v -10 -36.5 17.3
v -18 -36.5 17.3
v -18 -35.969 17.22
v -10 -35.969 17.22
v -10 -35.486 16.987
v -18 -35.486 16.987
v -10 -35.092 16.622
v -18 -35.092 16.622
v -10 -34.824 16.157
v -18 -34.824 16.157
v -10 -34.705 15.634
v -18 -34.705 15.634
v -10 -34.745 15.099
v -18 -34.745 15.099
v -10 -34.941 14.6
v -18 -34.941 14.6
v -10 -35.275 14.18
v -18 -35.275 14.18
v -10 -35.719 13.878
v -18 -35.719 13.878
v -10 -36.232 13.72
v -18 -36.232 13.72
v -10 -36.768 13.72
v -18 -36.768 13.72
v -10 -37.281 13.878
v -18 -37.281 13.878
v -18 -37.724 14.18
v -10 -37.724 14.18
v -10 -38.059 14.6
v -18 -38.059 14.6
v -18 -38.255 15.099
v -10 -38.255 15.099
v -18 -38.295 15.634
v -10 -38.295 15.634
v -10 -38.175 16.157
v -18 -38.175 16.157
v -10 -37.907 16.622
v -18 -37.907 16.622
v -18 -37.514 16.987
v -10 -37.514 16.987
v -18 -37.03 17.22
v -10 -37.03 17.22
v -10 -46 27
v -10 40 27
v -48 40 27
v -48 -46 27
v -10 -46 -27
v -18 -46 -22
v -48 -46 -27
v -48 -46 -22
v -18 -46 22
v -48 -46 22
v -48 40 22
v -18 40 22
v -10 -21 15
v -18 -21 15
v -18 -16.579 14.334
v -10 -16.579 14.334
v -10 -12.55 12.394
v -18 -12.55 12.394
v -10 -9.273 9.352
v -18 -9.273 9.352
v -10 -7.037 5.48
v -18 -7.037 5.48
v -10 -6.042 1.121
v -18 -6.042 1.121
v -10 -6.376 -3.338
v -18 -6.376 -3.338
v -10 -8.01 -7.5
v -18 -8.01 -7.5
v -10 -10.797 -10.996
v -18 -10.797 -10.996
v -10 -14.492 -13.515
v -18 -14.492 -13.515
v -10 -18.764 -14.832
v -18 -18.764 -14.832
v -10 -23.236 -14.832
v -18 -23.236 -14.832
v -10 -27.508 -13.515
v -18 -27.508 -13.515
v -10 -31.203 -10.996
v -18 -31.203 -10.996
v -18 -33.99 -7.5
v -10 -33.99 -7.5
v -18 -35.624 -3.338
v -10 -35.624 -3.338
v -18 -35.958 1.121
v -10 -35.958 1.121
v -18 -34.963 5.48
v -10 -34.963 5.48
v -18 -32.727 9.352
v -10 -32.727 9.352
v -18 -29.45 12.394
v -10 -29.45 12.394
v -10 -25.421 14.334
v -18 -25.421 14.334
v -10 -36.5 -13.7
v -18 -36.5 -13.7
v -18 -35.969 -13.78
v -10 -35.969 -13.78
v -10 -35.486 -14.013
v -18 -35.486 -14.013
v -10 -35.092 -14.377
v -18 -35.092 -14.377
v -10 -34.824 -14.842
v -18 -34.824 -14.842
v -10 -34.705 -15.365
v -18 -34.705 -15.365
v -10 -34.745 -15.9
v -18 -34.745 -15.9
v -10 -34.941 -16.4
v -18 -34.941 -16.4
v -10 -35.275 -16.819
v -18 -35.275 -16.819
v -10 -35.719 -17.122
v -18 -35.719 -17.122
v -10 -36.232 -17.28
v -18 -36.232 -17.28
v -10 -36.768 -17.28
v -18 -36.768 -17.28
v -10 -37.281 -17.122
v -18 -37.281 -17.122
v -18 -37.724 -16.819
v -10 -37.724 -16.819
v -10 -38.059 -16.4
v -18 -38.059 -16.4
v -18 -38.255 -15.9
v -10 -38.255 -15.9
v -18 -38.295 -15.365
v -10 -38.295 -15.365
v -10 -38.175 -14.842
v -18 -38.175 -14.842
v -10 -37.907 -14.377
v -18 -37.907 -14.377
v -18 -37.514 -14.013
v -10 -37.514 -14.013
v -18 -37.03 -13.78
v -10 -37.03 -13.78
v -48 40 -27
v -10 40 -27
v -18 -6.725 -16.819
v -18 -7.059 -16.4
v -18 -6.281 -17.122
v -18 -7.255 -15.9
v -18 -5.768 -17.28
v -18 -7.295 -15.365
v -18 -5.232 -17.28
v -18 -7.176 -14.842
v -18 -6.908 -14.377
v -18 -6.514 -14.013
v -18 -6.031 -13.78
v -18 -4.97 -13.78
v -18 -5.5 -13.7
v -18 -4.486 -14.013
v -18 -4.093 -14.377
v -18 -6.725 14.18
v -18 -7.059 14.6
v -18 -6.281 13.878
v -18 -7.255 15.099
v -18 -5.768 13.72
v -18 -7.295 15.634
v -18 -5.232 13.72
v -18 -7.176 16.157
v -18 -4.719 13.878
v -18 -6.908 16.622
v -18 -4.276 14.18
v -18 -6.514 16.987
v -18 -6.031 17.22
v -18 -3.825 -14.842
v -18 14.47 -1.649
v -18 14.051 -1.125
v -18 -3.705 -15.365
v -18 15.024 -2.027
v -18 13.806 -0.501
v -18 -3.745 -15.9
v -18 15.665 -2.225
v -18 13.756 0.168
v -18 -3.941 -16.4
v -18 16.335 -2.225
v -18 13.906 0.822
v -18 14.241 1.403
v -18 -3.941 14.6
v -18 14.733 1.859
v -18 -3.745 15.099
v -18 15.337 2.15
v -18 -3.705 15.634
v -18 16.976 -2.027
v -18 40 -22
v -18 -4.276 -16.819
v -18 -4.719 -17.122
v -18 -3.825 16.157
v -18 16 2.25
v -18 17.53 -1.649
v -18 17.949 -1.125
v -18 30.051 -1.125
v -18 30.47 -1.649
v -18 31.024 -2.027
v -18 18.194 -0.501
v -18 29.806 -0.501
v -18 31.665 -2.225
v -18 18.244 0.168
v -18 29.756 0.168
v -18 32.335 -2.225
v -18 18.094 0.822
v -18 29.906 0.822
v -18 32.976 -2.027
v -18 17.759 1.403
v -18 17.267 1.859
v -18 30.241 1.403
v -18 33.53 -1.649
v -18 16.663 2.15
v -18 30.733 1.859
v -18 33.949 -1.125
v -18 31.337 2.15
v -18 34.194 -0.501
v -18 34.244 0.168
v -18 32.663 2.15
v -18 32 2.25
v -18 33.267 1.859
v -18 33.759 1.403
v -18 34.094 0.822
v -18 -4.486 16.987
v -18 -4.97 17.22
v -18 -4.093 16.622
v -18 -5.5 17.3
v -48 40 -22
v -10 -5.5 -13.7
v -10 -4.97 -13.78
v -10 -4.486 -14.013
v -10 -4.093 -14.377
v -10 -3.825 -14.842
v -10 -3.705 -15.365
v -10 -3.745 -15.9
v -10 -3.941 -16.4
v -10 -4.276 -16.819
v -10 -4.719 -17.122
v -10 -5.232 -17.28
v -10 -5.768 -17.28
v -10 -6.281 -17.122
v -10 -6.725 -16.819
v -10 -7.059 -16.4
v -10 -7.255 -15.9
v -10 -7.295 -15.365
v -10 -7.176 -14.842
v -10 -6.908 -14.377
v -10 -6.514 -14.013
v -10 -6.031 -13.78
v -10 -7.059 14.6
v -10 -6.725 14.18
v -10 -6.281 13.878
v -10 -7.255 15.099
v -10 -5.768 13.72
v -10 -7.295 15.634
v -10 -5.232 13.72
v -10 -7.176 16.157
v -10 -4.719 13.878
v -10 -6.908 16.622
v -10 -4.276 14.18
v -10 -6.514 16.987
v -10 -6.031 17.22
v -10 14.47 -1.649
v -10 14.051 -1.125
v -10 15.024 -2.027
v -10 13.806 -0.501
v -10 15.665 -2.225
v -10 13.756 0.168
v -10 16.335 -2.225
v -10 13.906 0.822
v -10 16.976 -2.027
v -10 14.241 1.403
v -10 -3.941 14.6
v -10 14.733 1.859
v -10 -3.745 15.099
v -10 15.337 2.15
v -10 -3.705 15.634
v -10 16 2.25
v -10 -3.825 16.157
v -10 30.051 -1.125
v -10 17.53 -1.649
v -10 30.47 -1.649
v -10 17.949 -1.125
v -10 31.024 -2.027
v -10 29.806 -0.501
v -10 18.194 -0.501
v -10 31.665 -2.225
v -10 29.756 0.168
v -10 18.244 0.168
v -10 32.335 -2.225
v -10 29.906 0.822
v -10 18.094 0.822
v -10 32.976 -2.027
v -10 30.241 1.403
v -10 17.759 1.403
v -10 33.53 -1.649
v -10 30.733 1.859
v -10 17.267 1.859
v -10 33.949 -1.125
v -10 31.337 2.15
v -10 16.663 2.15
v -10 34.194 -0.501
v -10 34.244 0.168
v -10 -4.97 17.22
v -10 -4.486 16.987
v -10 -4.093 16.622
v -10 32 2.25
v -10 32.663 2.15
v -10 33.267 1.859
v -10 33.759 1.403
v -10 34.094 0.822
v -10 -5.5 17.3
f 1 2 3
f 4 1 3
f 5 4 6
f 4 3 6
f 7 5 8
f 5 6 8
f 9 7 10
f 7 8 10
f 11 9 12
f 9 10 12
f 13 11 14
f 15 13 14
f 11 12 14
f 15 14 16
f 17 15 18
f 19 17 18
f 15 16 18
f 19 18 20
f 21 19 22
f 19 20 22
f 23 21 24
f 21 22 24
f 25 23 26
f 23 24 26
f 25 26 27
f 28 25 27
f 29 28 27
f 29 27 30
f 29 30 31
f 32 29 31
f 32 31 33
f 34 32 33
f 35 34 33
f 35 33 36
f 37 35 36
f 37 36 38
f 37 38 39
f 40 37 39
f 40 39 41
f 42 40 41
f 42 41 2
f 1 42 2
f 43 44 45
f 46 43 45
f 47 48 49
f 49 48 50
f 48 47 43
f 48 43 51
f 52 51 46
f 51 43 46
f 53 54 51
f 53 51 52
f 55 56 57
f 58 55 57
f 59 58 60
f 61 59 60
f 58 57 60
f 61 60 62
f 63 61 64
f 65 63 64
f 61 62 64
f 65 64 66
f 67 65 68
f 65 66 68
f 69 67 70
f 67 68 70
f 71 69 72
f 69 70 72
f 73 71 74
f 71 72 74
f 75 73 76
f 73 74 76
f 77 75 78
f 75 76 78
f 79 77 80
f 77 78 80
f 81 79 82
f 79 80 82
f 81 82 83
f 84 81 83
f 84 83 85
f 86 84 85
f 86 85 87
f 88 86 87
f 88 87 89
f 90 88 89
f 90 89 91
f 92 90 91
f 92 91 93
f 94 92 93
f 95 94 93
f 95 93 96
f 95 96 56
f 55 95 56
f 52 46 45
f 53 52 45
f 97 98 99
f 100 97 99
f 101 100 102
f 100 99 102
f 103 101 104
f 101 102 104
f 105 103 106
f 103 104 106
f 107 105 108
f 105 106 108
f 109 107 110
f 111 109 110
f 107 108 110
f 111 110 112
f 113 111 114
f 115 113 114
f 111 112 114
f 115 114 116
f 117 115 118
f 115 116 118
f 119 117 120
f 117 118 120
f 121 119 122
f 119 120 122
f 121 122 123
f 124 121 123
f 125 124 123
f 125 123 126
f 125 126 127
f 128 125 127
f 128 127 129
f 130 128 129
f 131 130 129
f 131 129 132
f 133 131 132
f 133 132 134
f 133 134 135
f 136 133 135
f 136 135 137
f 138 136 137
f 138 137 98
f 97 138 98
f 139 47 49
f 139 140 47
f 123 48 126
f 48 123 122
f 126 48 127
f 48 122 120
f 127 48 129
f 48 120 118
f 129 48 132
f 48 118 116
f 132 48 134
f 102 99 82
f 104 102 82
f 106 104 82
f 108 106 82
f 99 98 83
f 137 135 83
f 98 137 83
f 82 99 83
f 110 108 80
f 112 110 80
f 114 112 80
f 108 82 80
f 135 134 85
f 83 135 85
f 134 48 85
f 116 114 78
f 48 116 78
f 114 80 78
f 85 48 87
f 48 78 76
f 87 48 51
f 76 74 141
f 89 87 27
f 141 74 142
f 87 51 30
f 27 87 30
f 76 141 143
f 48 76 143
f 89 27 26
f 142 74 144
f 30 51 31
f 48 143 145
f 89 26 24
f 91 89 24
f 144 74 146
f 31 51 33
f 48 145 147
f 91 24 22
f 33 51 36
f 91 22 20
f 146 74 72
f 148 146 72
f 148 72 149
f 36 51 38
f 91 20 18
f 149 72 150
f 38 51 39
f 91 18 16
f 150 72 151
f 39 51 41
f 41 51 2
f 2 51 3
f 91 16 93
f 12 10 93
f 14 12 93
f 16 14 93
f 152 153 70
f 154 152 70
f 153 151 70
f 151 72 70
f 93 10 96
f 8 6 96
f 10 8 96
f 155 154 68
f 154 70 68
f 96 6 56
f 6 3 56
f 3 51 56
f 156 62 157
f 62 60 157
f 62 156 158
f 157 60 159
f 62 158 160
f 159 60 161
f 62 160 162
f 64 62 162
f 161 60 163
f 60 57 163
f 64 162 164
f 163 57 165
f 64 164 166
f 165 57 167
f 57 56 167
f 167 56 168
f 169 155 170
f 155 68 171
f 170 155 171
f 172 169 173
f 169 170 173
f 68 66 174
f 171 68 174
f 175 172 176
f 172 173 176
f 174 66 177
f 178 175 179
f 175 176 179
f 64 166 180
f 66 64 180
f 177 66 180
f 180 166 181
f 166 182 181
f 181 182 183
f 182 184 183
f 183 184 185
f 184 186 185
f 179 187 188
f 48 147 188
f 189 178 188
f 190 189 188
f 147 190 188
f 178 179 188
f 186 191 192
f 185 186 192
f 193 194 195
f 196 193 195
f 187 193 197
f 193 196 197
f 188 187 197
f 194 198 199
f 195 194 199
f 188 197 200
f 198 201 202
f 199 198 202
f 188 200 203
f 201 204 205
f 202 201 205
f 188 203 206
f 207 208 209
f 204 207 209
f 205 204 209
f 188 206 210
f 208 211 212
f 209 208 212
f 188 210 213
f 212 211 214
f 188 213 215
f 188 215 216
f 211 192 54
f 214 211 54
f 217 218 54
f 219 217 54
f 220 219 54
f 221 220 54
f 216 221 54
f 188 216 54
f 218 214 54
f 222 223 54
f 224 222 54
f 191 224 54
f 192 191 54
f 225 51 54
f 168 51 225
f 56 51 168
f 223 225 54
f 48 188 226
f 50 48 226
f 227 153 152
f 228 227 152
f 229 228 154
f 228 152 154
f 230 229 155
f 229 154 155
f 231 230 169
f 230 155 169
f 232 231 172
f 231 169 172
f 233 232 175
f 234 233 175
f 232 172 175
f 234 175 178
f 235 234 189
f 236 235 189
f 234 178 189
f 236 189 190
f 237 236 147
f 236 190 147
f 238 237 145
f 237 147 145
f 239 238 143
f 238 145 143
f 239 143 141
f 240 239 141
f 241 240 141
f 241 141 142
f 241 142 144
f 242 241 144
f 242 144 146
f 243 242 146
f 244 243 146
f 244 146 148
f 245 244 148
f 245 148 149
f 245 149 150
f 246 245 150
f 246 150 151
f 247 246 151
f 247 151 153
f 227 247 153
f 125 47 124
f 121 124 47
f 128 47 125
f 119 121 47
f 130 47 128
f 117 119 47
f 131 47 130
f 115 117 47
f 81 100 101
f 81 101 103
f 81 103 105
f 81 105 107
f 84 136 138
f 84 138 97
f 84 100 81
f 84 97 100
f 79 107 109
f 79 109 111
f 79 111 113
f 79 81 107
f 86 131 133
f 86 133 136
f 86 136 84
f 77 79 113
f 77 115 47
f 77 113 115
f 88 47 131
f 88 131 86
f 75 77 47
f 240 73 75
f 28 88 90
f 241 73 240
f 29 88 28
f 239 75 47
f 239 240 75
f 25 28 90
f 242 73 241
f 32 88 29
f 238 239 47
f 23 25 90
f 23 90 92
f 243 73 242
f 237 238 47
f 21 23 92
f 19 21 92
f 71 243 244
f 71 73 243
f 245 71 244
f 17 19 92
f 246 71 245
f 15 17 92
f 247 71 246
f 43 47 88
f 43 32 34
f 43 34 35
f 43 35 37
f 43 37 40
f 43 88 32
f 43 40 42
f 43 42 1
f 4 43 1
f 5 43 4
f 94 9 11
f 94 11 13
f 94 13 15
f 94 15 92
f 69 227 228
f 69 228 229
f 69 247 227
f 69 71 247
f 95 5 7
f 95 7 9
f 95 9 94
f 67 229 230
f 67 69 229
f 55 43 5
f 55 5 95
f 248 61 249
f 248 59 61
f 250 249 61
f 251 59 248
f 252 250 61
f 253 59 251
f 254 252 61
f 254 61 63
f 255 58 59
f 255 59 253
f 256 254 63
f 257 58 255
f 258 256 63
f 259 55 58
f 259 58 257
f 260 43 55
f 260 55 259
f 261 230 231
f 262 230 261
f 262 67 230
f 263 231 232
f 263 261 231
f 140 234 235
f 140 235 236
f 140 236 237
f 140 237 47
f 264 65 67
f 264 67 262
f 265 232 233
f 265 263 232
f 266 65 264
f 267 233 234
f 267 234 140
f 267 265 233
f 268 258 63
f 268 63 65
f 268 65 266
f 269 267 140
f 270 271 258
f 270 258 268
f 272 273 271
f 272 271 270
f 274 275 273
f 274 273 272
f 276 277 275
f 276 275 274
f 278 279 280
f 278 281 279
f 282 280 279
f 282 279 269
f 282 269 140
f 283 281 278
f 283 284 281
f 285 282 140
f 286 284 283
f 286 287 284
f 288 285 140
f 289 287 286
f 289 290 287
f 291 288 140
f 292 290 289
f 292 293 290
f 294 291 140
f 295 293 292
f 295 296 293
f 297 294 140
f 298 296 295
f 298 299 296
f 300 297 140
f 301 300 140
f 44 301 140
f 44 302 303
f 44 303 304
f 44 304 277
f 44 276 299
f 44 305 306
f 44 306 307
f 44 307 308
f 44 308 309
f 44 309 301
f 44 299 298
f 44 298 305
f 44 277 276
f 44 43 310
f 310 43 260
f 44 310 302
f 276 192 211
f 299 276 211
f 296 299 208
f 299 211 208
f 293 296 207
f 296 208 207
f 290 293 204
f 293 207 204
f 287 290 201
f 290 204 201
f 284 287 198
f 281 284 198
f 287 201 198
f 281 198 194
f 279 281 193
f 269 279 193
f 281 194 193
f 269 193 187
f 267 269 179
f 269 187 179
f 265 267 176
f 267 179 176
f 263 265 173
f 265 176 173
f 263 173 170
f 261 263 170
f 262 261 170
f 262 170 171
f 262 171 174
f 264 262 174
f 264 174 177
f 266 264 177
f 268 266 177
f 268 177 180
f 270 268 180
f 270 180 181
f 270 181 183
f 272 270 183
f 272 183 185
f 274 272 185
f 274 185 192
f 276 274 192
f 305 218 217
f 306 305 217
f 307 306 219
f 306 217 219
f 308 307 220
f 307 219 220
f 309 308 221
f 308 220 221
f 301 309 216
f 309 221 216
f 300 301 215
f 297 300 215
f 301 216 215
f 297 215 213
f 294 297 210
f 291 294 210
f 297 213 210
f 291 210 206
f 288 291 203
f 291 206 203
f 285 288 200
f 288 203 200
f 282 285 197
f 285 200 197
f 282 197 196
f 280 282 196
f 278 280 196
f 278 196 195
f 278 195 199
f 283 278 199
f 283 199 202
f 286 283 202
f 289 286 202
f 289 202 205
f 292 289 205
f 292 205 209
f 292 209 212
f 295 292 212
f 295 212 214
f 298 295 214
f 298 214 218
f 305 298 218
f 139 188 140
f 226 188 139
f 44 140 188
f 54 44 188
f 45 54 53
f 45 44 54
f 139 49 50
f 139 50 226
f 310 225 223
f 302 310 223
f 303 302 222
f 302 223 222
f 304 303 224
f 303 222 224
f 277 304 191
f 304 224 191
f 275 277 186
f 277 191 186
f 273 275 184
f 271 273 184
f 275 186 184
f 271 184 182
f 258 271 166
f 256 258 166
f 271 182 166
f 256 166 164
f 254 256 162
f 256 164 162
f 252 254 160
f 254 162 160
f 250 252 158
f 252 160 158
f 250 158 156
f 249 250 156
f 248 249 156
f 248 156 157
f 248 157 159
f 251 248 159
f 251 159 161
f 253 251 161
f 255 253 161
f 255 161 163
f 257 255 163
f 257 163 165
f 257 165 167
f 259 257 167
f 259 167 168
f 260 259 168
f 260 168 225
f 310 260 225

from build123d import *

# Parameters (mm, degrees)
SKETCH1_W           = 28
SKETCH1_H           = 28
SKETCH1_W_2         = 20
SKETCH1_H_2         = 20
BOSS_EXTRUDE1_DEPTH = 40
SKETCH2_R           = 2.25
CUT_EXTRUDE1_DEPTH  = 30
SKETCH5_W           = 50
SKETCH5_H           = 50
SKETCH5_R           = 1.8
SKETCH5_R_2         = 15
BOSS_EXTRUDE2_DEPTH = 4
SKETCH6_W           = 24
SKETCH6_H           = 28
CUT_EXTRUDE2_DEPTH  = 40
SKETCH7_W           = 4
SKETCH7_H           = 36
CUT_EXTRUDE3_DEPTH  = 4
SKETCH8_W           = 15
SKETCH8_H           = 36
BOSS_EXTRUDE3_DEPTH = 4
BOSS_EXTRUDE4_START = 4
SKETCH11_W          = 50
SKETCH11_H          = 86
SKETCH11_R          = 1.8
SKETCH11_R_2        = 15
SKETCH11_R_3        = 2.25
BOSS_EXTRUDE4_DEPTH = 4
SKETCH13_W          = 8
SKETCH13_H          = 86
BOSS_EXTRUDE5_DEPTH = 2
SKETCH14_W          = 8
SKETCH14_H          = 86
BOSS_EXTRUDE6_DEPTH = 2
SKETCH16_W          = 30
SKETCH16_H          = 86
BOSS_EXTRUDE7_DEPTH = 5


with BuildPart() as part:
    # Sketch1 → Boss-Extrude1 (new body)
    with BuildSketch(Plane(origin=(0, 0, 0), x_dir=(1, 0, 0), z_dir=(0, 1, 0))):
        Rectangle(SKETCH1_W, SKETCH1_H)
        Rectangle(SKETCH1_W_2, SKETCH1_H_2, mode=Mode.SUBTRACT)
    extrude(amount=BOSS_EXTRUDE1_DEPTH)

    # Sketch2 → Cut-Extrude1 (cut)
    with BuildSketch(Plane.ZY.offset(14)):
        with Locations((0, 32)):
            Circle(SKETCH2_R)
        with Locations((0, 16)):
            Circle(SKETCH2_R)
    extrude(amount=-CUT_EXTRUDE1_DEPTH, mode=Mode.SUBTRACT)

    # Sketch5 → Boss-Extrude2 (add)
    with BuildSketch(Plane.ZY.offset(14)):
        with Locations((0, -21)):
            Rectangle(SKETCH5_W, SKETCH5_H)
        with Locations((-15.499780644, -5.500219356)):
            Circle(SKETCH5_R, mode=Mode.SUBTRACT)
        with Locations((15.499780644, -5.500219356)):
            Circle(SKETCH5_R, mode=Mode.SUBTRACT)
        with Locations((15.499780644, -36.499780644)):
            Circle(SKETCH5_R, mode=Mode.SUBTRACT)
        with Locations((-15.499780644, -36.499780644)):
            Circle(SKETCH5_R, mode=Mode.SUBTRACT)
        with Locations((0, -21)):
            Circle(SKETCH5_R_2, mode=Mode.SUBTRACT)
    extrude(amount=-BOSS_EXTRUDE2_DEPTH)

    # Sketch6 → Cut-Extrude2 (cut)
    with BuildSketch(Plane.XZ):
        with Locations((2, 0)):
            Rectangle(SKETCH6_W, SKETCH6_H)
    extrude(amount=-CUT_EXTRUDE2_DEPTH, mode=Mode.SUBTRACT)

    # Sketch7 → Cut-Extrude3 (cut)
    with BuildSketch(Plane.ZY.offset(14)):
        with Locations((-12, 22)):
            Rectangle(SKETCH7_W, SKETCH7_H)
        with Locations((12, 22)):
            Rectangle(SKETCH7_W, SKETCH7_H)
    extrude(amount=-CUT_EXTRUDE3_DEPTH, mode=Mode.SUBTRACT)

    # Sketch8 → Boss-Extrude3 (add)
    with BuildSketch(Plane.ZY.offset(14)):
        with Locations((-17.5, 22)):
            Rectangle(SKETCH8_W, SKETCH8_H)
        with Locations((17.5, 22)):
            Rectangle(SKETCH8_W, SKETCH8_H)
    extrude(amount=-BOSS_EXTRUDE3_DEPTH)

    # Sketch11 → Boss-Extrude4 (add)
    with BuildSketch(Plane.ZY.offset(14).offset(BOSS_EXTRUDE4_START)):
        with Locations((0, -3)):
            Rectangle(SKETCH11_W, SKETCH11_H)
        with Locations((15.499780644, -5.500219356)):
            Circle(SKETCH11_R, mode=Mode.SUBTRACT)
        with Locations((15.499780644, -36.499780644)):
            Circle(SKETCH11_R, mode=Mode.SUBTRACT)
        with Locations((-15.499780644, -36.499780644)):
            Circle(SKETCH11_R, mode=Mode.SUBTRACT)
        with Locations((0, -21)):
            Circle(SKETCH11_R_2, mode=Mode.SUBTRACT)
        with Locations((0, 32)):
            Circle(SKETCH11_R_3, mode=Mode.SUBTRACT)
        with Locations((0, 16)):
            Circle(SKETCH11_R_3, mode=Mode.SUBTRACT)
        with Locations((-15.499780644, -5.500219356)):
            Circle(SKETCH11_R, mode=Mode.SUBTRACT)
    extrude(amount=-BOSS_EXTRUDE4_DEPTH)

    # Sketch13 → Boss-Extrude5 (add)
    with BuildSketch(Plane.XY.offset(25)):
        with Locations((-14, -3)):
            Rectangle(SKETCH13_W, SKETCH13_H)
    extrude(amount=BOSS_EXTRUDE5_DEPTH)

    # Sketch14 → Boss-Extrude6 (add)
    with BuildSketch(Plane(origin=(0, 0, -25), x_dir=(-1, 0, 0), z_dir=(0, 0, -1))):
        with Locations((14, -3)):
            Rectangle(SKETCH14_W, SKETCH14_H)
    extrude(amount=BOSS_EXTRUDE6_DEPTH)

    # Sketch16 → Boss-Extrude7 (add)
    with BuildSketch(Plane(origin=(0, 0, -27), x_dir=(-1, 0, 0), z_dir=(0, 0, -1))):
        with Locations((33, -3)):
            Rectangle(SKETCH16_W, SKETCH16_H)
    boss_extrude7 = extrude(amount=-BOSS_EXTRUDE7_DEPTH)

    # Mirror1: Boss-Extrude7 across plane
    add(boss_extrude7.mirror(Plane.XY))


solid = part.part
